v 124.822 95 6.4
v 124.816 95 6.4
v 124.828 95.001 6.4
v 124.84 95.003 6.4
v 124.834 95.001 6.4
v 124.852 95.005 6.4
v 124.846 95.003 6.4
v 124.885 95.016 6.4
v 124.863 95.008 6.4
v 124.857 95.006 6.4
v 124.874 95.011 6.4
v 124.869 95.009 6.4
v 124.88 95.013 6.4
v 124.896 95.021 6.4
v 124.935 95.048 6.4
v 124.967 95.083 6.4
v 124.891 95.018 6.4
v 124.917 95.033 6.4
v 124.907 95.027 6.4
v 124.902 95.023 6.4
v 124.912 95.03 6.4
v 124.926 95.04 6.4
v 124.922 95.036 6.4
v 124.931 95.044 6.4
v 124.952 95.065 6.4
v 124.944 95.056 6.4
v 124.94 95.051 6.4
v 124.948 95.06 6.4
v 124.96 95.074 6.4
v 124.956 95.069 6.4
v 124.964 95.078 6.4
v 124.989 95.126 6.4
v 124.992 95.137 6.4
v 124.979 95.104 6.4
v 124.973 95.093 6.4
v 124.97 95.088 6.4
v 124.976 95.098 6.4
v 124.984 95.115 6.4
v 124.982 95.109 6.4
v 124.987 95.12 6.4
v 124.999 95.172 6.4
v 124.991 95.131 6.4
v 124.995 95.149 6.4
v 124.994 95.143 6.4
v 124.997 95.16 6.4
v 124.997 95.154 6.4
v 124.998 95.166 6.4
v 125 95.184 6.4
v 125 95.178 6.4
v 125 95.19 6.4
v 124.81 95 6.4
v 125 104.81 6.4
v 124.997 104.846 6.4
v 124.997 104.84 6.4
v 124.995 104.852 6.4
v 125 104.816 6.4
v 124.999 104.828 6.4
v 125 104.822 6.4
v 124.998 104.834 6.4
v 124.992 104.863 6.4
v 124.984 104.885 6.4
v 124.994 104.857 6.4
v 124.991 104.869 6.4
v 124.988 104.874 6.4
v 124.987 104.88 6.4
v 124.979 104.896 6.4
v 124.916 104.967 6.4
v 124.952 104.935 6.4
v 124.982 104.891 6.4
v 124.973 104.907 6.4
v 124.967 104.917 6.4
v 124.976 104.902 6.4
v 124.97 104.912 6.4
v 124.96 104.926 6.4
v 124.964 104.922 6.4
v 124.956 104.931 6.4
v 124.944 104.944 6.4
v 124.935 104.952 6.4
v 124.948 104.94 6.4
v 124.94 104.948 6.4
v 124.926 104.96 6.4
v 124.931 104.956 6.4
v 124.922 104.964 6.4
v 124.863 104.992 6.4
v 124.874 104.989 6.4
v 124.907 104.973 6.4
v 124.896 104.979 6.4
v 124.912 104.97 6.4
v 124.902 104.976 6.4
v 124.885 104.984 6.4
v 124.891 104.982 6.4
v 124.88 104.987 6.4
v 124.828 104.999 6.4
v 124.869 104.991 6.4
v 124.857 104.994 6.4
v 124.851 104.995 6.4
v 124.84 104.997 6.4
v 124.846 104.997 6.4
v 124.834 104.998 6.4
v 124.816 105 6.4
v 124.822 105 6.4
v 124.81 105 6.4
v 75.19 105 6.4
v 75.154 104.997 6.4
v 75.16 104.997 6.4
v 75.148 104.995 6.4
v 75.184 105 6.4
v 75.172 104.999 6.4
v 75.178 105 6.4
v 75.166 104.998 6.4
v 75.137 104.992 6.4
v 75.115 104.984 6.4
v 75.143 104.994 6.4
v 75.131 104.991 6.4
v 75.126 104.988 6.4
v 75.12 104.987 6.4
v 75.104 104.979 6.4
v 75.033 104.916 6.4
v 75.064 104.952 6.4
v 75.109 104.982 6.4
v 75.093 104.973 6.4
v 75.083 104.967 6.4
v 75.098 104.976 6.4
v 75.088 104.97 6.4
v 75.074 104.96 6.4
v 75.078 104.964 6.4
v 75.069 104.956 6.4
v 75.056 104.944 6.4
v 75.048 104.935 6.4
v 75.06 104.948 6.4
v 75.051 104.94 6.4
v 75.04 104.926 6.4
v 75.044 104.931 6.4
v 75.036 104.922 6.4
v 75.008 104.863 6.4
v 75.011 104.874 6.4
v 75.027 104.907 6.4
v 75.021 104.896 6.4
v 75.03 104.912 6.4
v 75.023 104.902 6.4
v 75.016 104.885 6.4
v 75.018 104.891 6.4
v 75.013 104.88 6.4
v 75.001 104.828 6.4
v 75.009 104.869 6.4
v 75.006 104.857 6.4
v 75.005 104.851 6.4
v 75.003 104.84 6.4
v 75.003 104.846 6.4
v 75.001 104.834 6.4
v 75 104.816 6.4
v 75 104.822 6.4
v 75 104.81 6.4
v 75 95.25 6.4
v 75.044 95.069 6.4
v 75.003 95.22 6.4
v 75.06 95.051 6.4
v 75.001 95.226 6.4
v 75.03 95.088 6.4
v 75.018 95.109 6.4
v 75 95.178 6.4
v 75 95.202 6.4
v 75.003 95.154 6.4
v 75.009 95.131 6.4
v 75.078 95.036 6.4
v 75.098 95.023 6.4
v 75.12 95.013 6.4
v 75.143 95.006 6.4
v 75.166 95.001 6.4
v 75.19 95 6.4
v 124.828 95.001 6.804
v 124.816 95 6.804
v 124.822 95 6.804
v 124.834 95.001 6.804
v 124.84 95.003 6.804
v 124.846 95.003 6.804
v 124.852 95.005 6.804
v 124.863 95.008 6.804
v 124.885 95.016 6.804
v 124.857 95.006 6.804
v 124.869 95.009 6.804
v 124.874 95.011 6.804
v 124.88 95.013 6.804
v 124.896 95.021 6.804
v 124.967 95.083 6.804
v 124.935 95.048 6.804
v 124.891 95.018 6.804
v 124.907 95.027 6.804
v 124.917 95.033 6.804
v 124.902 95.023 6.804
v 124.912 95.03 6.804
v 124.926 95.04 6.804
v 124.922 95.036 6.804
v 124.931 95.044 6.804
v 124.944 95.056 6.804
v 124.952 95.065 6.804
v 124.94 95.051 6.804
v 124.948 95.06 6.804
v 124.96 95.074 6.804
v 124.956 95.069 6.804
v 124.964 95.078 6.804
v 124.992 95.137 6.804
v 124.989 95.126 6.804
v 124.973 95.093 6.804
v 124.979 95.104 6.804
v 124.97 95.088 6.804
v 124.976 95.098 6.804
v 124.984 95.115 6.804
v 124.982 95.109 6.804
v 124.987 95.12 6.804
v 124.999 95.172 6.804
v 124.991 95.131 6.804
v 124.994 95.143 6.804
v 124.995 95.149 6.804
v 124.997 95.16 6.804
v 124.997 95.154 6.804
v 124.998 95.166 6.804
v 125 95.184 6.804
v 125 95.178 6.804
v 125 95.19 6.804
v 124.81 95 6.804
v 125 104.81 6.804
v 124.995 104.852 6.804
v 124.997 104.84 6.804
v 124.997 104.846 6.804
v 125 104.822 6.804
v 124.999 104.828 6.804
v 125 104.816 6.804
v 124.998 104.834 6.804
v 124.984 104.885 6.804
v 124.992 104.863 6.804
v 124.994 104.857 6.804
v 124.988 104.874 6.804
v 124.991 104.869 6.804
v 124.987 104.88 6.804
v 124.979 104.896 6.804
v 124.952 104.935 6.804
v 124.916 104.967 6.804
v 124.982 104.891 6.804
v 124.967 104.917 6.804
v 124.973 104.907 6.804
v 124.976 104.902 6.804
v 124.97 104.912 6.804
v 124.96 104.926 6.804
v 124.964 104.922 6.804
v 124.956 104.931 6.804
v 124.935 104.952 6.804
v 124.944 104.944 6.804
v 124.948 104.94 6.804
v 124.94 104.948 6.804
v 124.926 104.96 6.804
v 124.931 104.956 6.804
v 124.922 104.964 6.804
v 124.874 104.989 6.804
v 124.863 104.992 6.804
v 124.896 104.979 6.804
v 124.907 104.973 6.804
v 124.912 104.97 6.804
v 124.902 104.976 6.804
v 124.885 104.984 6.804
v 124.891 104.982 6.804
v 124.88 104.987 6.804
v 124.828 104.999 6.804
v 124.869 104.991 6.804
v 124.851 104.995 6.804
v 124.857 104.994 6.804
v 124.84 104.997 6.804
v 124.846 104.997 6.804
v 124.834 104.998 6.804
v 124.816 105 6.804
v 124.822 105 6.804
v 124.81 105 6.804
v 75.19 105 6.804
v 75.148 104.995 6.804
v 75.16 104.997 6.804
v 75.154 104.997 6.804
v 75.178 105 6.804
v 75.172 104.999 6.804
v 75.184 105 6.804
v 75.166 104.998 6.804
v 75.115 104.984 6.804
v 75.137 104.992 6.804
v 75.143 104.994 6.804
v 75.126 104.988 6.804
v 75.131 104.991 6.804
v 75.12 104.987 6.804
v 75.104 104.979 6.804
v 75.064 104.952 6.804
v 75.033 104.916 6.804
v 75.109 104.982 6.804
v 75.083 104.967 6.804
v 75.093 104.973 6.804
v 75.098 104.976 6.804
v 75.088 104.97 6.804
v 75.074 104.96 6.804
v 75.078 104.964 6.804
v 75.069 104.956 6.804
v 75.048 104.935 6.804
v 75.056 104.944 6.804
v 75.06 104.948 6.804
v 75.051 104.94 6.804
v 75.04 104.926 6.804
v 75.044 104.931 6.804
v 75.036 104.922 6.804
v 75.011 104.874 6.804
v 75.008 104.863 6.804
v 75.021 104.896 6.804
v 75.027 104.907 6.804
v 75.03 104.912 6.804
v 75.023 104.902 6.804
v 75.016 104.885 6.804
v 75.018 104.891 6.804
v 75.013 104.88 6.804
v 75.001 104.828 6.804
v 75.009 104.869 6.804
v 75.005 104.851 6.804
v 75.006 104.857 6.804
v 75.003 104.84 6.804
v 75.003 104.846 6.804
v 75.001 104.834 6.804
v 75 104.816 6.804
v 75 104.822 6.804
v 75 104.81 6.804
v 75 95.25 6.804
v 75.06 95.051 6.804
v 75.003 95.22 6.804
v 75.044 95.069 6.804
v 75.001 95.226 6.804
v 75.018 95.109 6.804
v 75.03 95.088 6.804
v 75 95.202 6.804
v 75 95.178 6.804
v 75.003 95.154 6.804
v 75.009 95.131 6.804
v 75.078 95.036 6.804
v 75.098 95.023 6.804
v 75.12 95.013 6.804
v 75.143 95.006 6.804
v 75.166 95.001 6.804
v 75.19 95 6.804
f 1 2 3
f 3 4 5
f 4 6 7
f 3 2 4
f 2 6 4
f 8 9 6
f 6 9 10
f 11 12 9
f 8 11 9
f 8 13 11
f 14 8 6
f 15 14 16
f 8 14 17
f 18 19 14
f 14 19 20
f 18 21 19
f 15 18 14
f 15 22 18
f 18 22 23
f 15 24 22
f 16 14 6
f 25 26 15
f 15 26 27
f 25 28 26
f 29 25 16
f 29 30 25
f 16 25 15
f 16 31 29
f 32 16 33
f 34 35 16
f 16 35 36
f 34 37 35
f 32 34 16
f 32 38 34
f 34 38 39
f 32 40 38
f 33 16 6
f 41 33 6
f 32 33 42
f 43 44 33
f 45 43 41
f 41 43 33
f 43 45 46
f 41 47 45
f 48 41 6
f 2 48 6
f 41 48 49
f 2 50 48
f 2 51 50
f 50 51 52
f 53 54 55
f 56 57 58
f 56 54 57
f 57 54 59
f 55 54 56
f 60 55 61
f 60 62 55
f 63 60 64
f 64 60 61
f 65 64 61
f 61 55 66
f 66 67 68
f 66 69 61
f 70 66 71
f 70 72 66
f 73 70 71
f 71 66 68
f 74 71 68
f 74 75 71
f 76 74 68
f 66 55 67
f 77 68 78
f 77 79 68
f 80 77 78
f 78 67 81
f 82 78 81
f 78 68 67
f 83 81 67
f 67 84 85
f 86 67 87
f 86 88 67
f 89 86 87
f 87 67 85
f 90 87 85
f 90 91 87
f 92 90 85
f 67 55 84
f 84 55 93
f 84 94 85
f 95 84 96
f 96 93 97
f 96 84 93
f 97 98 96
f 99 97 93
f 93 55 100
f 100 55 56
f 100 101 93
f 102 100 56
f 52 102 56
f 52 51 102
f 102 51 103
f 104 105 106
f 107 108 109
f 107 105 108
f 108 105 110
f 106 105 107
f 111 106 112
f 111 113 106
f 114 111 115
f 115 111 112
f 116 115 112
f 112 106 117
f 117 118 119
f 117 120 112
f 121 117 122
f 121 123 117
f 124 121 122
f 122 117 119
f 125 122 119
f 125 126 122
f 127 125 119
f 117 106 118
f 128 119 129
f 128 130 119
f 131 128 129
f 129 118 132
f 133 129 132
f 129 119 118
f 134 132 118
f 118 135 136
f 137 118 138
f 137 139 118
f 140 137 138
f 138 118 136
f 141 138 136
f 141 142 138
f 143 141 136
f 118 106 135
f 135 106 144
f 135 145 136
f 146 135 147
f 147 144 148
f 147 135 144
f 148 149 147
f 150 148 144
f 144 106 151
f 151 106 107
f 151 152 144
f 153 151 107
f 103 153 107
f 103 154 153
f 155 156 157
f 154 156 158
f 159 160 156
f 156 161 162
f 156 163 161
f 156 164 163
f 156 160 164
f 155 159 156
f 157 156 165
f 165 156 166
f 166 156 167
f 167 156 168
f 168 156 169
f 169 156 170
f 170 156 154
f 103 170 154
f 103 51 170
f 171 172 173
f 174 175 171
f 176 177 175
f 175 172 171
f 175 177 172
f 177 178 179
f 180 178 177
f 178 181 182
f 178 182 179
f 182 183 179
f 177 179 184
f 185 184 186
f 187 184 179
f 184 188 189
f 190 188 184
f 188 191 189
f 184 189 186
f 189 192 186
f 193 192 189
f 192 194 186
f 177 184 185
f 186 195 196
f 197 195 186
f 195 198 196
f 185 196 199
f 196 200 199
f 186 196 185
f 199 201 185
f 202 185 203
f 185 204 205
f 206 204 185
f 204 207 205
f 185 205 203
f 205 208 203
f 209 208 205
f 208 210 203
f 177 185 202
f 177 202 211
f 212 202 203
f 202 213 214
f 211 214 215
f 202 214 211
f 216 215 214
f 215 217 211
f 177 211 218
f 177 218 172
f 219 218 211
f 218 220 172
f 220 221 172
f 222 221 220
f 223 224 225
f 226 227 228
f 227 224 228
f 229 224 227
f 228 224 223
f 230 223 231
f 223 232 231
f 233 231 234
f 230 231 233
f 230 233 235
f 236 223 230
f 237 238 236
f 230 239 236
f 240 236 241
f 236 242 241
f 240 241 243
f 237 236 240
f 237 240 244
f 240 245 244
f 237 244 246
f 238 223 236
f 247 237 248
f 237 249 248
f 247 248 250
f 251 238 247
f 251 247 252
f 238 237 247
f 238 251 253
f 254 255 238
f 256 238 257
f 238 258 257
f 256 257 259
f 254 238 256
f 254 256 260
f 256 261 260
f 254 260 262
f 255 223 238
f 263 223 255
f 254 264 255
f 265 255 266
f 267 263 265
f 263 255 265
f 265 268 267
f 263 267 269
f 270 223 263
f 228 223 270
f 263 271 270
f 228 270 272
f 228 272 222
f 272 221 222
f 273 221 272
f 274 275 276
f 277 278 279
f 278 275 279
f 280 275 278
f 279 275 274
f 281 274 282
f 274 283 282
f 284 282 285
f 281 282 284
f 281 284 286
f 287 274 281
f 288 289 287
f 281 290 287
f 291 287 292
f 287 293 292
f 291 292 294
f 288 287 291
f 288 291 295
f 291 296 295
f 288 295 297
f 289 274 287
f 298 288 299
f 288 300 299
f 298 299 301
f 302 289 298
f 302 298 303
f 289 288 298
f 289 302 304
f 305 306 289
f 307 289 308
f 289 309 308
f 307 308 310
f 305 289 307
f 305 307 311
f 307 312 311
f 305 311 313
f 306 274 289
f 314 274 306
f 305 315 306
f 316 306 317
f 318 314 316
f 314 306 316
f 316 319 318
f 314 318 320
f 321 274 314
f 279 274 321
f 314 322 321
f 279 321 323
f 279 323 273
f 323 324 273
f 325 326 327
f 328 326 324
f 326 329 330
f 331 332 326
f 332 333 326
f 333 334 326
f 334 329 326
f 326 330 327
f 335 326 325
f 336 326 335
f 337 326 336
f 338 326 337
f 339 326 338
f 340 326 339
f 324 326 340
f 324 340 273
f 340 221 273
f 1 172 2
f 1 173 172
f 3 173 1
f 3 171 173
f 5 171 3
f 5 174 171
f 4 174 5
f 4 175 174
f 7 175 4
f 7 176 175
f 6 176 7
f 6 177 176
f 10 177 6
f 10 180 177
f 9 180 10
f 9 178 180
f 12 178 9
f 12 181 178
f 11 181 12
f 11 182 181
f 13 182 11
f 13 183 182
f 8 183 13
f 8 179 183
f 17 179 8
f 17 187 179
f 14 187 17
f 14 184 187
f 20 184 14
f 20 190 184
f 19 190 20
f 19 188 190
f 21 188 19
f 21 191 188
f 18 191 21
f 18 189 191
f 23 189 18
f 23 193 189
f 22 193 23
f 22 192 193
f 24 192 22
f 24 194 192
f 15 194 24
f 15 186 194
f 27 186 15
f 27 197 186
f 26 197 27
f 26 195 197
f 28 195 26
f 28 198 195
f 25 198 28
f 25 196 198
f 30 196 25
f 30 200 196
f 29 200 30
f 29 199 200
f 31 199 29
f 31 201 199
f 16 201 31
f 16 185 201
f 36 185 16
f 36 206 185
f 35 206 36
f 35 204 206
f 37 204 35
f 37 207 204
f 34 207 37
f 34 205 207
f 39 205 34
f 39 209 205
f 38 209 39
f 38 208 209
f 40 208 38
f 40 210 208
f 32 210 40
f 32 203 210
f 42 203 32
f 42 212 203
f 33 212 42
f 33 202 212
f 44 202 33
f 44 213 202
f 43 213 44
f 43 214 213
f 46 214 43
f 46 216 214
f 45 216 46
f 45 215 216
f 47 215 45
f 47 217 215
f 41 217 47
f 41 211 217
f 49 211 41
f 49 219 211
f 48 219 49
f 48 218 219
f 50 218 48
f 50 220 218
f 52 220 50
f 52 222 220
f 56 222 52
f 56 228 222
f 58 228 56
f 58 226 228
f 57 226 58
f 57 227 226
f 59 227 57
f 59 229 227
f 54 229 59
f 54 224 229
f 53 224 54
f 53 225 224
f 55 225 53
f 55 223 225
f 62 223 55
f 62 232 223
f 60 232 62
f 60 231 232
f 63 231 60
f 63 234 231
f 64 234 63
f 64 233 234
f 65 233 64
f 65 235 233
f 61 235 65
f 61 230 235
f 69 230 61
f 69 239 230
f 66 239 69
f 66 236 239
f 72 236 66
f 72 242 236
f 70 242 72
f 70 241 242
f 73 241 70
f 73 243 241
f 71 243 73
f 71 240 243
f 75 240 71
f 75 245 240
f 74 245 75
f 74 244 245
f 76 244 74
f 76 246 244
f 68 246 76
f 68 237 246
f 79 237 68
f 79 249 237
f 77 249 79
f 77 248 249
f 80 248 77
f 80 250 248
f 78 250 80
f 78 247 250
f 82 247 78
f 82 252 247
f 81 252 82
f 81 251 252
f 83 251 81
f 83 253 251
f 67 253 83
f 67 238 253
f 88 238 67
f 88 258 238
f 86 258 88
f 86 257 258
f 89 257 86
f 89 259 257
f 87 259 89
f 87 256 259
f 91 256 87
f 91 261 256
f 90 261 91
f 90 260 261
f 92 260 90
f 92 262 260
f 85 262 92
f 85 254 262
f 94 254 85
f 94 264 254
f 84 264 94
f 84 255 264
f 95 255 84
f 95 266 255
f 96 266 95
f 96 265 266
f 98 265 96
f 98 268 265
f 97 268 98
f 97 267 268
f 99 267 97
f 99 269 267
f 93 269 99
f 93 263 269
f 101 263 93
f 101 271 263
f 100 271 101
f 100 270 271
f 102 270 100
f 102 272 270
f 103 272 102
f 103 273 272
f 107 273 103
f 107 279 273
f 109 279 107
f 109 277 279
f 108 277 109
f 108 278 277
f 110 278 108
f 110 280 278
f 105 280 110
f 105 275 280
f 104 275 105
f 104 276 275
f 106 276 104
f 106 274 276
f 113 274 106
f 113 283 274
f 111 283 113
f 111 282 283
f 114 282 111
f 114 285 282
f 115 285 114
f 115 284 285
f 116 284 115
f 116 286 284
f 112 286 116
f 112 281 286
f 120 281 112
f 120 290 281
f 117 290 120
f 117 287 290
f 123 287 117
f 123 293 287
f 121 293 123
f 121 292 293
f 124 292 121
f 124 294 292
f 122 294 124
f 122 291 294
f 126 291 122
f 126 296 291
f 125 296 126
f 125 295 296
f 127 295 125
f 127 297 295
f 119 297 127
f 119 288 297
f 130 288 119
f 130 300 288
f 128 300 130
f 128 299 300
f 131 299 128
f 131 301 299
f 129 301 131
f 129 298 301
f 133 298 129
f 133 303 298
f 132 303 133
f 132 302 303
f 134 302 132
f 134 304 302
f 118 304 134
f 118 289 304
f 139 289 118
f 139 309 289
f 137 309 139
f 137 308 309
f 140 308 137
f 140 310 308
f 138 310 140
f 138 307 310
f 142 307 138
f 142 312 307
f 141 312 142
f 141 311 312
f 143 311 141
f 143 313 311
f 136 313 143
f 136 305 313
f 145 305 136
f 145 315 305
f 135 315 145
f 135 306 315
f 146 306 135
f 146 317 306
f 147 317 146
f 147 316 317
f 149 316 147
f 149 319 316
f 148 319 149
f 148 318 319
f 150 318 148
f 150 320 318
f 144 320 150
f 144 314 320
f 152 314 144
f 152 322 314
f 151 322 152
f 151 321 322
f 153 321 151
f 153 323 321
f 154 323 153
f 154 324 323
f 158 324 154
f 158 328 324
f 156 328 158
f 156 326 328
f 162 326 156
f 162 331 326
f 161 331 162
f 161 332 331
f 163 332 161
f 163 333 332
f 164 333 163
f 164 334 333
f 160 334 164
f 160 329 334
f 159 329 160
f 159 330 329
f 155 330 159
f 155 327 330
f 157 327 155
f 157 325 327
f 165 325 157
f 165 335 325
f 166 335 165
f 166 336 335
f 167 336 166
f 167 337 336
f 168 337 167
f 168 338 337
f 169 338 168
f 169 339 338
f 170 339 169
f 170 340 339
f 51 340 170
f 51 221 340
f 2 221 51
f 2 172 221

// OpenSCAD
module drawBasicShape(x1, y1, x2, y2, width)
{
	length = sqrt((x1-x2)*(x1-x2) + (y1-y2)*(y1-y2));
	if (width!=0.0) {
		square(size = [width, length], center = false);
		translate([width/2.0, 0, 0]) circle(d=width);
		translate([width/2.0, length, 0]) circle(d=width);
	}
}

module translateAndRotate(x1, y1, x2, y2, width)
{
	if (width != 0.0) {
		angle = atan((y2-y1)/(x2-x1)) +270;
		if (x2>=x1) {
			translate([x1, y1, 0.0]) rotate([0.0, 0.0, angle]) translate([-width/2.0, 0.0, 0.0]) scale([1.0, 1.0, 1.0]) drawBasicShape(x1, y1, x2, y2, width);
		}
		else {
			translate([x1, y1, 0.0]) rotate([0.0, 0.0, angle+180]) translate([-width/2.0, 0.0, 0.0]) scale([1.0, 1.0, 1.0]) drawBasicShape(x1, y1, x2, y2, width);		}
	}
}

$fn=50;

points15 = [
[75.77800000, 95.77800000, 0.00000000],
[124.22200000, 95.77800000, 0.37999548],
[124.22200000, 104.22200000, 0.37997788],
[75.77800000, 104.22200000, 0.37999672],
[75.77800000, 95.83800000, 0.37997423],
[75.48400000, 95.48400000, 0.00000000],
[124.51600000, 95.48400000, 0.37999868],
[124.51600000, 104.51600000, 0.37998977],
[75.48400000, 104.51600000, 0.37999746],
[75.48400000, 95.54400000, 0.37999314],
[75.19000000, 95.19000000, 0.00000000],
[124.81000000, 95.19000000, 0.37999939],
[124.81000000, 104.81000000, 0.38000021],
[75.19000000, 104.81000000, 0.38000060],
[75.19000000, 95.25000000, 0.37999715],
[75.53600000, 95.39000000, 0.00000000],
[76.11100000, 95.94600000, 0.00000000],
[75.94600000, 96.11100000, 0.37961375],
[75.94600000, 96.52800000, 0.38001190],
[76.52800000, 95.94600000, 0.37989934],
[76.94500000, 95.94600000, 0.38001190],
[75.94600000, 96.94500000, 0.37998907],
[75.94600000, 97.36200000, 0.38001190],
[77.36200000, 95.94600000, 0.37999592],
[77.77900000, 95.94600000, 0.38001190],
[75.94600000, 97.77900000, 0.37999966],
[75.94600000, 98.19600000, 0.38001190],
[78.19600000, 95.94600000, 0.38002091],
[78.61300000, 95.94600000, 0.38001190],
[75.94600000, 98.61300000, 0.38001957],
[75.94600000, 99.03000000, 0.38001190],
[79.03000000, 95.94600000, 0.38001859],
[79.44700000, 95.94600000, 0.38001190],
[75.94600000, 99.44700000, 0.38002999],
[75.94600000, 99.86400000, 0.38001190],
[79.86400000, 95.94600000, 0.38002811],
[80.28100000, 95.94600000, 0.38001190],
[75.94600000, 100.28100000, 0.38002660],
[75.94600000, 100.69800000, 0.38001190],
[80.69800000, 95.94600000, 0.38003429],
[81.11500000, 95.94600000, 0.38001190],
[75.94600000, 101.11500000, 0.38002430],
[75.94600000, 101.53300000, 0.37945200],
[81.53300000, 95.94600000, 0.37997836],
[81.95000000, 95.94600000, 0.38001190],
[75.94600000, 101.95000000, 0.37998072],
[75.94600000, 102.36700000, 0.38015610],
[82.36700000, 95.94600000, 0.37998277],
[82.78400000, 95.94600000, 0.38001190],
[75.94600000, 102.78400000, 0.37999079],
[75.94600000, 103.20100000, 0.38015610],
[83.20100000, 95.94600000, 0.37999203],
[83.61800000, 95.94600000, 0.38001190],
[75.94600000, 103.61800000, 0.37999868],
[75.95600000, 104.02400000, 0.38048727],
[84.03500000, 95.94600000, 0.38000275],
[84.45200000, 95.94600000, 0.38001190],
[76.34400000, 104.05400000, 0.38000229],
[76.76100000, 104.05400000, 0.38001190],
[84.86900000, 95.94600000, 0.38000754],
[85.28600000, 95.94600000, 0.38001190],
[77.17800000, 104.05400000, 0.38000229],
[77.59500000, 104.05400000, 0.38015610],
[85.70300000, 95.94600000, 0.38000229],
[86.12000000, 95.94600000, 0.38001190],
[78.01200000, 104.05400000, 0.38000754],
[78.42900000, 104.05400000, 0.38001190],
[86.53700000, 95.94600000, 0.38000229],
[86.95400000, 95.94600000, 0.38001190],
[78.84600000, 104.05400000, 0.38000754],
[79.26300000, 104.05400000, 0.38001190],
[87.37100000, 95.94600000, 0.38000229],
[87.78900000, 95.94600000, 0.37945200],
[79.68000000, 104.05400000, 0.37998415],
[80.09700000, 104.05400000, 0.38001190],
[88.20600000, 95.94600000, 0.37998415],
[88.62300000, 95.94600000, 0.38015610],
[80.51500000, 104.05400000, 0.38000229],
[80.93200000, 104.05400000, 0.38001190],
[89.04000000, 95.94600000, 0.38000754],
[89.45700000, 95.94600000, 0.38001190],
[81.34900000, 104.05400000, 0.38000229],
[81.76600000, 104.05400000, 0.38001190],
[89.87400000, 95.94600000, 0.38000754],
[90.29100000, 95.94600000, 0.38001190],
[82.18300000, 104.05400000, 0.38000229],
[82.60000000, 104.05400000, 0.38015610],
[90.70800000, 95.94600000, 0.38000229],
[91.12500000, 95.94600000, 0.38001190],
[83.01700000, 104.05400000, 0.38000754],
[83.43400000, 104.05400000, 0.38001190],
[91.54200000, 95.94600000, 0.38000229],
[91.95900000, 95.94600000, 0.38001190],
[83.85100000, 104.05400000, 0.38000754],
[84.26800000, 104.05400000, 0.38001190],
[92.37600000, 95.94600000, 0.38000229],
[92.79300000, 95.94600000, 0.38015610],
[84.68500000, 104.05400000, 0.38000229],
[85.10200000, 104.05400000, 0.38001190],
[93.21000000, 95.94600000, 0.38000754],
[93.62700000, 95.94600000, 0.38001190],
[85.51900000, 104.05400000, 0.38000229],
[85.93600000, 104.05400000, 0.38001190],
[94.04400000, 95.94600000, 0.38000754],
[94.46200000, 95.94600000, 0.37930814],
[86.35300000, 104.05400000, 0.37998415],
[86.77000000, 104.05400000, 0.38015610],
[94.87900000, 95.94600000, 0.37998415],
[95.29600000, 95.94600000, 0.38001190],
[87.18800000, 104.05400000, 0.38000754],
[87.60500000, 104.05400000, 0.38001190],
[95.71300000, 95.94600000, 0.38000229],
[96.13000000, 95.94600000, 0.38001190],
[88.02200000, 104.05400000, 0.38000754],
[88.43900000, 104.05400000, 0.38001190],
[96.54700000, 95.94600000, 0.38000229],
[96.96400000, 95.94600000, 0.38015610],
[88.85600000, 104.05400000, 0.38000229],
[89.27300000, 104.05400000, 0.38001190],
[97.38100000, 95.94600000, 0.38000754],
[97.79800000, 95.94600000, 0.38001190],
[89.69000000, 104.05400000, 0.38000229],
[90.10700000, 104.05400000, 0.38001190],
[98.21500000, 95.94600000, 0.38000754],
[98.63200000, 95.94600000, 0.38001190],
[90.52400000, 104.05400000, 0.38000229],
[90.94100000, 104.05400000, 0.38015610],
[99.04900000, 95.94600000, 0.38000229],
[99.46600000, 95.94600000, 0.38001190],
[91.35800000, 104.05400000, 0.38000754],
[91.77500000, 104.05400000, 0.38001190],
[99.88300000, 95.94600000, 0.38000229],
[100.30000000, 95.94600000, 0.38001190],
[92.19200000, 104.05400000, 0.38000754],
[92.60900000, 104.05400000, 0.38001190],
[100.71800000, 95.94600000, 0.37998415],
[101.13500000, 95.94600000, 0.38015610],
[93.02600000, 104.05400000, 0.37998415],
[93.44400000, 104.05400000, 0.37930814],
[101.55200000, 95.94600000, 0.38000754],
[101.96900000, 95.94600000, 0.38001190],
[93.86100000, 104.05400000, 0.38000229],
[94.27800000, 104.05400000, 0.38001190],
[102.38600000, 95.94600000, 0.38000754],
[102.80300000, 95.94600000, 0.38001190],
[94.69500000, 104.05400000, 0.38000229],
[95.11200000, 104.05400000, 0.38015610],
[103.22000000, 95.94600000, 0.38000229],
[103.63700000, 95.94600000, 0.38001190],
[95.52900000, 104.05400000, 0.38000754],
[95.94600000, 104.05400000, 0.38001190],
[104.05400000, 95.94600000, 0.38000229],
[104.47100000, 95.94600000, 0.38001190],
[96.36300000, 104.05400000, 0.38000754],
[96.78000000, 104.05400000, 0.38001190],
[104.88800000, 95.94600000, 0.38000229],
[105.30500000, 95.94600000, 0.38015610],
[97.19700000, 104.05400000, 0.38000229],
[97.61400000, 104.05400000, 0.38001190],
[105.72200000, 95.94600000, 0.38000754],
[106.13900000, 95.94600000, 0.38001190],
[98.03100000, 104.05400000, 0.38000229],
[98.44800000, 104.05400000, 0.38001190],
[106.55600000, 95.94600000, 0.38000754],
[106.97300000, 95.94600000, 0.38001190],
[98.86500000, 104.05400000, 0.38000229],
[99.28200000, 104.05400000, 0.38015610],
[107.39100000, 95.94600000, 0.37998415],
[107.80800000, 95.94600000, 0.38001190],
[99.69900000, 104.05400000, 0.37998940],
[100.11700000, 104.05400000, 0.37930814],
[108.22500000, 95.94600000, 0.38000229],
[108.64200000, 95.94600000, 0.38001190],
[100.53400000, 104.05400000, 0.38000754],
[100.95100000, 104.05400000, 0.38001190],
[109.05900000, 95.94600000, 0.38000229],
[109.47600000, 95.94600000, 0.38015610],
[101.36800000, 104.05400000, 0.38000229],
[101.78500000, 104.05400000, 0.38001190],
[109.89300000, 95.94600000, 0.38000754],
[110.31000000, 95.94600000, 0.38001190],
[102.20200000, 104.05400000, 0.38000229],
[102.61900000, 104.05400000, 0.38001190],
[110.72700000, 95.94600000, 0.38000754],
[111.14400000, 95.94600000, 0.38001190],
[103.03600000, 104.05400000, 0.38000229],
[103.45300000, 104.05400000, 0.38015610],
[111.56100000, 95.94600000, 0.38000229],
[111.97800000, 95.94600000, 0.38001190],
[103.87000000, 104.05400000, 0.38000754],
[104.28700000, 104.05400000, 0.38001190],
[112.39500000, 95.94600000, 0.38000229],
[112.81200000, 95.94600000, 0.38001190],
[104.70400000, 104.05400000, 0.38000754],
[105.12100000, 104.05400000, 0.38001190],
[113.22900000, 95.94600000, 0.38000229],
[113.64700000, 95.94600000, 0.37945200],
[105.53800000, 104.05400000, 0.37998415],
[105.95500000, 104.05400000, 0.38001190],
[114.06400000, 95.94600000, 0.37998940],
[114.48100000, 95.94600000, 0.38001190],
[106.37300000, 104.05400000, 0.38000229],
[106.79000000, 104.05400000, 0.38001190],
[114.89800000, 95.94600000, 0.38000754],
[115.31500000, 95.94600000, 0.38001190],
[107.20700000, 104.05400000, 0.38000229],
[107.62400000, 104.05400000, 0.38015610],
[115.73200000, 95.94600000, 0.38000229],
[116.14900000, 95.94600000, 0.38001190],
[108.04100000, 104.05400000, 0.38000754],
[108.45800000, 104.05400000, 0.38001190],
[116.56600000, 95.94600000, 0.38000229],
[116.98300000, 95.94600000, 0.38001190],
[108.87500000, 104.05400000, 0.38000754],
[109.29200000, 104.05400000, 0.38001190],
[117.40000000, 95.94600000, 0.38000229],
[117.81700000, 95.94600000, 0.38015610],
[109.70900000, 104.05400000, 0.38000229],
[110.12600000, 104.05400000, 0.38001190],
[118.23400000, 95.94600000, 0.38000754],
[118.65100000, 95.94600000, 0.38001190],
[110.54300000, 104.05400000, 0.38000229],
[110.96000000, 104.05400000, 0.38001190],
[119.06800000, 95.94600000, 0.38000754],
[119.48500000, 95.94600000, 0.38001190],
[111.37700000, 104.05400000, 0.38000229],
[111.79400000, 104.05400000, 0.38015610],
[119.90200000, 95.94600000, 0.38000229],
[120.32000000, 95.94600000, 0.37930814],
[112.21100000, 104.05400000, 0.37998415],
[112.62900000, 104.05400000, 0.37945200],
[120.73700000, 95.94600000, 0.38000229],
[121.15400000, 95.94600000, 0.38001190],
[113.04600000, 104.05400000, 0.38000754],
[113.46300000, 104.05400000, 0.38001190],
[121.57100000, 95.94600000, 0.38000229],
[121.98800000, 95.94600000, 0.38015610],
[113.88000000, 104.05400000, 0.38000229],
[114.29700000, 104.05400000, 0.38001190],
[122.40500000, 95.94600000, 0.38000229],
[122.82200000, 95.94600000, 0.38015610],
[114.71400000, 104.05400000, 0.38000229],
[115.13100000, 104.05400000, 0.38001190],
[123.23900000, 95.94600000, 0.38000754],
[123.65600000, 95.94600000, 0.38001190],
[115.54800000, 104.05400000, 0.38000229],
[115.96500000, 104.05400000, 0.38015610],
[124.04400000, 95.97500000, 0.37998455],
[124.05400000, 96.38200000, 0.37961606],
[116.38200000, 104.05400000, 0.37999868],
[116.79900000, 104.05400000, 0.38001190],
[124.05400000, 96.79900000, 0.37999789],
[124.05400000, 97.21600000, 0.38001190],
[117.21600000, 104.05400000, 0.37999701],
[117.63300000, 104.05400000, 0.38001190],
[124.05400000, 97.63300000, 0.37998939],
[124.05400000, 98.05000000, 0.38001190],
[118.05000000, 104.05400000, 0.37998780],
[118.46700000, 104.05400000, 0.38001190],
[124.05400000, 98.46700000, 0.37998597],
[124.05400000, 98.88400000, 0.38001190],
[118.88400000, 104.05400000, 0.37997562],
[119.30200000, 104.05400000, 0.37930814],
[124.05400000, 99.30200000, 0.38003429],
[124.05400000, 99.71900000, 0.38001190],
[119.71900000, 104.05400000, 0.38002660],
[120.13600000, 104.05400000, 0.38015610],
[124.05400000, 100.13600000, 0.38002811],
[124.05400000, 100.55300000, 0.38001190],
[120.55300000, 104.05400000, 0.38002999],
[120.97000000, 104.05400000, 0.38001190],
[124.05400000, 100.97000000, 0.38001859],
[124.05400000, 101.38700000, 0.38015610],
[121.38700000, 104.05400000, 0.38001957],
[121.80400000, 104.05400000, 0.38001190],
[124.05400000, 101.80400000, 0.38002091],
[124.05400000, 102.22100000, 0.38001190],
[122.22100000, 104.05400000, 0.37999966],
[122.63800000, 104.05400000, 0.38015610],
[124.05400000, 102.63800000, 0.37999592],
[124.05400000, 103.05500000, 0.38001190],
[123.05500000, 104.05400000, 0.37998907],
[123.47200000, 104.05400000, 0.38001190],
[124.05400000, 103.47200000, 0.37989934],
[124.05400000, 103.88900000, 0.38015610],
[123.88900000, 104.05400000, 0.37961375],
];

translate([0.0, 0.0, 6.40000000]) {
	linear_extrude(height = 0.40400000, center = false, convexity = 10, twist = 0) {
		union() {
			for( i=[0:len(points15)-2] ){ 
				x1 = points15[i][0];
				y1 = points15[i][1];
				x2 = points15[i+1][0];
				y2 = points15[i+1][1];
				width = points15[i+1][2];
				translateAndRotate(x1, y1, x2, y2, width);
			}
		}
	}
}
